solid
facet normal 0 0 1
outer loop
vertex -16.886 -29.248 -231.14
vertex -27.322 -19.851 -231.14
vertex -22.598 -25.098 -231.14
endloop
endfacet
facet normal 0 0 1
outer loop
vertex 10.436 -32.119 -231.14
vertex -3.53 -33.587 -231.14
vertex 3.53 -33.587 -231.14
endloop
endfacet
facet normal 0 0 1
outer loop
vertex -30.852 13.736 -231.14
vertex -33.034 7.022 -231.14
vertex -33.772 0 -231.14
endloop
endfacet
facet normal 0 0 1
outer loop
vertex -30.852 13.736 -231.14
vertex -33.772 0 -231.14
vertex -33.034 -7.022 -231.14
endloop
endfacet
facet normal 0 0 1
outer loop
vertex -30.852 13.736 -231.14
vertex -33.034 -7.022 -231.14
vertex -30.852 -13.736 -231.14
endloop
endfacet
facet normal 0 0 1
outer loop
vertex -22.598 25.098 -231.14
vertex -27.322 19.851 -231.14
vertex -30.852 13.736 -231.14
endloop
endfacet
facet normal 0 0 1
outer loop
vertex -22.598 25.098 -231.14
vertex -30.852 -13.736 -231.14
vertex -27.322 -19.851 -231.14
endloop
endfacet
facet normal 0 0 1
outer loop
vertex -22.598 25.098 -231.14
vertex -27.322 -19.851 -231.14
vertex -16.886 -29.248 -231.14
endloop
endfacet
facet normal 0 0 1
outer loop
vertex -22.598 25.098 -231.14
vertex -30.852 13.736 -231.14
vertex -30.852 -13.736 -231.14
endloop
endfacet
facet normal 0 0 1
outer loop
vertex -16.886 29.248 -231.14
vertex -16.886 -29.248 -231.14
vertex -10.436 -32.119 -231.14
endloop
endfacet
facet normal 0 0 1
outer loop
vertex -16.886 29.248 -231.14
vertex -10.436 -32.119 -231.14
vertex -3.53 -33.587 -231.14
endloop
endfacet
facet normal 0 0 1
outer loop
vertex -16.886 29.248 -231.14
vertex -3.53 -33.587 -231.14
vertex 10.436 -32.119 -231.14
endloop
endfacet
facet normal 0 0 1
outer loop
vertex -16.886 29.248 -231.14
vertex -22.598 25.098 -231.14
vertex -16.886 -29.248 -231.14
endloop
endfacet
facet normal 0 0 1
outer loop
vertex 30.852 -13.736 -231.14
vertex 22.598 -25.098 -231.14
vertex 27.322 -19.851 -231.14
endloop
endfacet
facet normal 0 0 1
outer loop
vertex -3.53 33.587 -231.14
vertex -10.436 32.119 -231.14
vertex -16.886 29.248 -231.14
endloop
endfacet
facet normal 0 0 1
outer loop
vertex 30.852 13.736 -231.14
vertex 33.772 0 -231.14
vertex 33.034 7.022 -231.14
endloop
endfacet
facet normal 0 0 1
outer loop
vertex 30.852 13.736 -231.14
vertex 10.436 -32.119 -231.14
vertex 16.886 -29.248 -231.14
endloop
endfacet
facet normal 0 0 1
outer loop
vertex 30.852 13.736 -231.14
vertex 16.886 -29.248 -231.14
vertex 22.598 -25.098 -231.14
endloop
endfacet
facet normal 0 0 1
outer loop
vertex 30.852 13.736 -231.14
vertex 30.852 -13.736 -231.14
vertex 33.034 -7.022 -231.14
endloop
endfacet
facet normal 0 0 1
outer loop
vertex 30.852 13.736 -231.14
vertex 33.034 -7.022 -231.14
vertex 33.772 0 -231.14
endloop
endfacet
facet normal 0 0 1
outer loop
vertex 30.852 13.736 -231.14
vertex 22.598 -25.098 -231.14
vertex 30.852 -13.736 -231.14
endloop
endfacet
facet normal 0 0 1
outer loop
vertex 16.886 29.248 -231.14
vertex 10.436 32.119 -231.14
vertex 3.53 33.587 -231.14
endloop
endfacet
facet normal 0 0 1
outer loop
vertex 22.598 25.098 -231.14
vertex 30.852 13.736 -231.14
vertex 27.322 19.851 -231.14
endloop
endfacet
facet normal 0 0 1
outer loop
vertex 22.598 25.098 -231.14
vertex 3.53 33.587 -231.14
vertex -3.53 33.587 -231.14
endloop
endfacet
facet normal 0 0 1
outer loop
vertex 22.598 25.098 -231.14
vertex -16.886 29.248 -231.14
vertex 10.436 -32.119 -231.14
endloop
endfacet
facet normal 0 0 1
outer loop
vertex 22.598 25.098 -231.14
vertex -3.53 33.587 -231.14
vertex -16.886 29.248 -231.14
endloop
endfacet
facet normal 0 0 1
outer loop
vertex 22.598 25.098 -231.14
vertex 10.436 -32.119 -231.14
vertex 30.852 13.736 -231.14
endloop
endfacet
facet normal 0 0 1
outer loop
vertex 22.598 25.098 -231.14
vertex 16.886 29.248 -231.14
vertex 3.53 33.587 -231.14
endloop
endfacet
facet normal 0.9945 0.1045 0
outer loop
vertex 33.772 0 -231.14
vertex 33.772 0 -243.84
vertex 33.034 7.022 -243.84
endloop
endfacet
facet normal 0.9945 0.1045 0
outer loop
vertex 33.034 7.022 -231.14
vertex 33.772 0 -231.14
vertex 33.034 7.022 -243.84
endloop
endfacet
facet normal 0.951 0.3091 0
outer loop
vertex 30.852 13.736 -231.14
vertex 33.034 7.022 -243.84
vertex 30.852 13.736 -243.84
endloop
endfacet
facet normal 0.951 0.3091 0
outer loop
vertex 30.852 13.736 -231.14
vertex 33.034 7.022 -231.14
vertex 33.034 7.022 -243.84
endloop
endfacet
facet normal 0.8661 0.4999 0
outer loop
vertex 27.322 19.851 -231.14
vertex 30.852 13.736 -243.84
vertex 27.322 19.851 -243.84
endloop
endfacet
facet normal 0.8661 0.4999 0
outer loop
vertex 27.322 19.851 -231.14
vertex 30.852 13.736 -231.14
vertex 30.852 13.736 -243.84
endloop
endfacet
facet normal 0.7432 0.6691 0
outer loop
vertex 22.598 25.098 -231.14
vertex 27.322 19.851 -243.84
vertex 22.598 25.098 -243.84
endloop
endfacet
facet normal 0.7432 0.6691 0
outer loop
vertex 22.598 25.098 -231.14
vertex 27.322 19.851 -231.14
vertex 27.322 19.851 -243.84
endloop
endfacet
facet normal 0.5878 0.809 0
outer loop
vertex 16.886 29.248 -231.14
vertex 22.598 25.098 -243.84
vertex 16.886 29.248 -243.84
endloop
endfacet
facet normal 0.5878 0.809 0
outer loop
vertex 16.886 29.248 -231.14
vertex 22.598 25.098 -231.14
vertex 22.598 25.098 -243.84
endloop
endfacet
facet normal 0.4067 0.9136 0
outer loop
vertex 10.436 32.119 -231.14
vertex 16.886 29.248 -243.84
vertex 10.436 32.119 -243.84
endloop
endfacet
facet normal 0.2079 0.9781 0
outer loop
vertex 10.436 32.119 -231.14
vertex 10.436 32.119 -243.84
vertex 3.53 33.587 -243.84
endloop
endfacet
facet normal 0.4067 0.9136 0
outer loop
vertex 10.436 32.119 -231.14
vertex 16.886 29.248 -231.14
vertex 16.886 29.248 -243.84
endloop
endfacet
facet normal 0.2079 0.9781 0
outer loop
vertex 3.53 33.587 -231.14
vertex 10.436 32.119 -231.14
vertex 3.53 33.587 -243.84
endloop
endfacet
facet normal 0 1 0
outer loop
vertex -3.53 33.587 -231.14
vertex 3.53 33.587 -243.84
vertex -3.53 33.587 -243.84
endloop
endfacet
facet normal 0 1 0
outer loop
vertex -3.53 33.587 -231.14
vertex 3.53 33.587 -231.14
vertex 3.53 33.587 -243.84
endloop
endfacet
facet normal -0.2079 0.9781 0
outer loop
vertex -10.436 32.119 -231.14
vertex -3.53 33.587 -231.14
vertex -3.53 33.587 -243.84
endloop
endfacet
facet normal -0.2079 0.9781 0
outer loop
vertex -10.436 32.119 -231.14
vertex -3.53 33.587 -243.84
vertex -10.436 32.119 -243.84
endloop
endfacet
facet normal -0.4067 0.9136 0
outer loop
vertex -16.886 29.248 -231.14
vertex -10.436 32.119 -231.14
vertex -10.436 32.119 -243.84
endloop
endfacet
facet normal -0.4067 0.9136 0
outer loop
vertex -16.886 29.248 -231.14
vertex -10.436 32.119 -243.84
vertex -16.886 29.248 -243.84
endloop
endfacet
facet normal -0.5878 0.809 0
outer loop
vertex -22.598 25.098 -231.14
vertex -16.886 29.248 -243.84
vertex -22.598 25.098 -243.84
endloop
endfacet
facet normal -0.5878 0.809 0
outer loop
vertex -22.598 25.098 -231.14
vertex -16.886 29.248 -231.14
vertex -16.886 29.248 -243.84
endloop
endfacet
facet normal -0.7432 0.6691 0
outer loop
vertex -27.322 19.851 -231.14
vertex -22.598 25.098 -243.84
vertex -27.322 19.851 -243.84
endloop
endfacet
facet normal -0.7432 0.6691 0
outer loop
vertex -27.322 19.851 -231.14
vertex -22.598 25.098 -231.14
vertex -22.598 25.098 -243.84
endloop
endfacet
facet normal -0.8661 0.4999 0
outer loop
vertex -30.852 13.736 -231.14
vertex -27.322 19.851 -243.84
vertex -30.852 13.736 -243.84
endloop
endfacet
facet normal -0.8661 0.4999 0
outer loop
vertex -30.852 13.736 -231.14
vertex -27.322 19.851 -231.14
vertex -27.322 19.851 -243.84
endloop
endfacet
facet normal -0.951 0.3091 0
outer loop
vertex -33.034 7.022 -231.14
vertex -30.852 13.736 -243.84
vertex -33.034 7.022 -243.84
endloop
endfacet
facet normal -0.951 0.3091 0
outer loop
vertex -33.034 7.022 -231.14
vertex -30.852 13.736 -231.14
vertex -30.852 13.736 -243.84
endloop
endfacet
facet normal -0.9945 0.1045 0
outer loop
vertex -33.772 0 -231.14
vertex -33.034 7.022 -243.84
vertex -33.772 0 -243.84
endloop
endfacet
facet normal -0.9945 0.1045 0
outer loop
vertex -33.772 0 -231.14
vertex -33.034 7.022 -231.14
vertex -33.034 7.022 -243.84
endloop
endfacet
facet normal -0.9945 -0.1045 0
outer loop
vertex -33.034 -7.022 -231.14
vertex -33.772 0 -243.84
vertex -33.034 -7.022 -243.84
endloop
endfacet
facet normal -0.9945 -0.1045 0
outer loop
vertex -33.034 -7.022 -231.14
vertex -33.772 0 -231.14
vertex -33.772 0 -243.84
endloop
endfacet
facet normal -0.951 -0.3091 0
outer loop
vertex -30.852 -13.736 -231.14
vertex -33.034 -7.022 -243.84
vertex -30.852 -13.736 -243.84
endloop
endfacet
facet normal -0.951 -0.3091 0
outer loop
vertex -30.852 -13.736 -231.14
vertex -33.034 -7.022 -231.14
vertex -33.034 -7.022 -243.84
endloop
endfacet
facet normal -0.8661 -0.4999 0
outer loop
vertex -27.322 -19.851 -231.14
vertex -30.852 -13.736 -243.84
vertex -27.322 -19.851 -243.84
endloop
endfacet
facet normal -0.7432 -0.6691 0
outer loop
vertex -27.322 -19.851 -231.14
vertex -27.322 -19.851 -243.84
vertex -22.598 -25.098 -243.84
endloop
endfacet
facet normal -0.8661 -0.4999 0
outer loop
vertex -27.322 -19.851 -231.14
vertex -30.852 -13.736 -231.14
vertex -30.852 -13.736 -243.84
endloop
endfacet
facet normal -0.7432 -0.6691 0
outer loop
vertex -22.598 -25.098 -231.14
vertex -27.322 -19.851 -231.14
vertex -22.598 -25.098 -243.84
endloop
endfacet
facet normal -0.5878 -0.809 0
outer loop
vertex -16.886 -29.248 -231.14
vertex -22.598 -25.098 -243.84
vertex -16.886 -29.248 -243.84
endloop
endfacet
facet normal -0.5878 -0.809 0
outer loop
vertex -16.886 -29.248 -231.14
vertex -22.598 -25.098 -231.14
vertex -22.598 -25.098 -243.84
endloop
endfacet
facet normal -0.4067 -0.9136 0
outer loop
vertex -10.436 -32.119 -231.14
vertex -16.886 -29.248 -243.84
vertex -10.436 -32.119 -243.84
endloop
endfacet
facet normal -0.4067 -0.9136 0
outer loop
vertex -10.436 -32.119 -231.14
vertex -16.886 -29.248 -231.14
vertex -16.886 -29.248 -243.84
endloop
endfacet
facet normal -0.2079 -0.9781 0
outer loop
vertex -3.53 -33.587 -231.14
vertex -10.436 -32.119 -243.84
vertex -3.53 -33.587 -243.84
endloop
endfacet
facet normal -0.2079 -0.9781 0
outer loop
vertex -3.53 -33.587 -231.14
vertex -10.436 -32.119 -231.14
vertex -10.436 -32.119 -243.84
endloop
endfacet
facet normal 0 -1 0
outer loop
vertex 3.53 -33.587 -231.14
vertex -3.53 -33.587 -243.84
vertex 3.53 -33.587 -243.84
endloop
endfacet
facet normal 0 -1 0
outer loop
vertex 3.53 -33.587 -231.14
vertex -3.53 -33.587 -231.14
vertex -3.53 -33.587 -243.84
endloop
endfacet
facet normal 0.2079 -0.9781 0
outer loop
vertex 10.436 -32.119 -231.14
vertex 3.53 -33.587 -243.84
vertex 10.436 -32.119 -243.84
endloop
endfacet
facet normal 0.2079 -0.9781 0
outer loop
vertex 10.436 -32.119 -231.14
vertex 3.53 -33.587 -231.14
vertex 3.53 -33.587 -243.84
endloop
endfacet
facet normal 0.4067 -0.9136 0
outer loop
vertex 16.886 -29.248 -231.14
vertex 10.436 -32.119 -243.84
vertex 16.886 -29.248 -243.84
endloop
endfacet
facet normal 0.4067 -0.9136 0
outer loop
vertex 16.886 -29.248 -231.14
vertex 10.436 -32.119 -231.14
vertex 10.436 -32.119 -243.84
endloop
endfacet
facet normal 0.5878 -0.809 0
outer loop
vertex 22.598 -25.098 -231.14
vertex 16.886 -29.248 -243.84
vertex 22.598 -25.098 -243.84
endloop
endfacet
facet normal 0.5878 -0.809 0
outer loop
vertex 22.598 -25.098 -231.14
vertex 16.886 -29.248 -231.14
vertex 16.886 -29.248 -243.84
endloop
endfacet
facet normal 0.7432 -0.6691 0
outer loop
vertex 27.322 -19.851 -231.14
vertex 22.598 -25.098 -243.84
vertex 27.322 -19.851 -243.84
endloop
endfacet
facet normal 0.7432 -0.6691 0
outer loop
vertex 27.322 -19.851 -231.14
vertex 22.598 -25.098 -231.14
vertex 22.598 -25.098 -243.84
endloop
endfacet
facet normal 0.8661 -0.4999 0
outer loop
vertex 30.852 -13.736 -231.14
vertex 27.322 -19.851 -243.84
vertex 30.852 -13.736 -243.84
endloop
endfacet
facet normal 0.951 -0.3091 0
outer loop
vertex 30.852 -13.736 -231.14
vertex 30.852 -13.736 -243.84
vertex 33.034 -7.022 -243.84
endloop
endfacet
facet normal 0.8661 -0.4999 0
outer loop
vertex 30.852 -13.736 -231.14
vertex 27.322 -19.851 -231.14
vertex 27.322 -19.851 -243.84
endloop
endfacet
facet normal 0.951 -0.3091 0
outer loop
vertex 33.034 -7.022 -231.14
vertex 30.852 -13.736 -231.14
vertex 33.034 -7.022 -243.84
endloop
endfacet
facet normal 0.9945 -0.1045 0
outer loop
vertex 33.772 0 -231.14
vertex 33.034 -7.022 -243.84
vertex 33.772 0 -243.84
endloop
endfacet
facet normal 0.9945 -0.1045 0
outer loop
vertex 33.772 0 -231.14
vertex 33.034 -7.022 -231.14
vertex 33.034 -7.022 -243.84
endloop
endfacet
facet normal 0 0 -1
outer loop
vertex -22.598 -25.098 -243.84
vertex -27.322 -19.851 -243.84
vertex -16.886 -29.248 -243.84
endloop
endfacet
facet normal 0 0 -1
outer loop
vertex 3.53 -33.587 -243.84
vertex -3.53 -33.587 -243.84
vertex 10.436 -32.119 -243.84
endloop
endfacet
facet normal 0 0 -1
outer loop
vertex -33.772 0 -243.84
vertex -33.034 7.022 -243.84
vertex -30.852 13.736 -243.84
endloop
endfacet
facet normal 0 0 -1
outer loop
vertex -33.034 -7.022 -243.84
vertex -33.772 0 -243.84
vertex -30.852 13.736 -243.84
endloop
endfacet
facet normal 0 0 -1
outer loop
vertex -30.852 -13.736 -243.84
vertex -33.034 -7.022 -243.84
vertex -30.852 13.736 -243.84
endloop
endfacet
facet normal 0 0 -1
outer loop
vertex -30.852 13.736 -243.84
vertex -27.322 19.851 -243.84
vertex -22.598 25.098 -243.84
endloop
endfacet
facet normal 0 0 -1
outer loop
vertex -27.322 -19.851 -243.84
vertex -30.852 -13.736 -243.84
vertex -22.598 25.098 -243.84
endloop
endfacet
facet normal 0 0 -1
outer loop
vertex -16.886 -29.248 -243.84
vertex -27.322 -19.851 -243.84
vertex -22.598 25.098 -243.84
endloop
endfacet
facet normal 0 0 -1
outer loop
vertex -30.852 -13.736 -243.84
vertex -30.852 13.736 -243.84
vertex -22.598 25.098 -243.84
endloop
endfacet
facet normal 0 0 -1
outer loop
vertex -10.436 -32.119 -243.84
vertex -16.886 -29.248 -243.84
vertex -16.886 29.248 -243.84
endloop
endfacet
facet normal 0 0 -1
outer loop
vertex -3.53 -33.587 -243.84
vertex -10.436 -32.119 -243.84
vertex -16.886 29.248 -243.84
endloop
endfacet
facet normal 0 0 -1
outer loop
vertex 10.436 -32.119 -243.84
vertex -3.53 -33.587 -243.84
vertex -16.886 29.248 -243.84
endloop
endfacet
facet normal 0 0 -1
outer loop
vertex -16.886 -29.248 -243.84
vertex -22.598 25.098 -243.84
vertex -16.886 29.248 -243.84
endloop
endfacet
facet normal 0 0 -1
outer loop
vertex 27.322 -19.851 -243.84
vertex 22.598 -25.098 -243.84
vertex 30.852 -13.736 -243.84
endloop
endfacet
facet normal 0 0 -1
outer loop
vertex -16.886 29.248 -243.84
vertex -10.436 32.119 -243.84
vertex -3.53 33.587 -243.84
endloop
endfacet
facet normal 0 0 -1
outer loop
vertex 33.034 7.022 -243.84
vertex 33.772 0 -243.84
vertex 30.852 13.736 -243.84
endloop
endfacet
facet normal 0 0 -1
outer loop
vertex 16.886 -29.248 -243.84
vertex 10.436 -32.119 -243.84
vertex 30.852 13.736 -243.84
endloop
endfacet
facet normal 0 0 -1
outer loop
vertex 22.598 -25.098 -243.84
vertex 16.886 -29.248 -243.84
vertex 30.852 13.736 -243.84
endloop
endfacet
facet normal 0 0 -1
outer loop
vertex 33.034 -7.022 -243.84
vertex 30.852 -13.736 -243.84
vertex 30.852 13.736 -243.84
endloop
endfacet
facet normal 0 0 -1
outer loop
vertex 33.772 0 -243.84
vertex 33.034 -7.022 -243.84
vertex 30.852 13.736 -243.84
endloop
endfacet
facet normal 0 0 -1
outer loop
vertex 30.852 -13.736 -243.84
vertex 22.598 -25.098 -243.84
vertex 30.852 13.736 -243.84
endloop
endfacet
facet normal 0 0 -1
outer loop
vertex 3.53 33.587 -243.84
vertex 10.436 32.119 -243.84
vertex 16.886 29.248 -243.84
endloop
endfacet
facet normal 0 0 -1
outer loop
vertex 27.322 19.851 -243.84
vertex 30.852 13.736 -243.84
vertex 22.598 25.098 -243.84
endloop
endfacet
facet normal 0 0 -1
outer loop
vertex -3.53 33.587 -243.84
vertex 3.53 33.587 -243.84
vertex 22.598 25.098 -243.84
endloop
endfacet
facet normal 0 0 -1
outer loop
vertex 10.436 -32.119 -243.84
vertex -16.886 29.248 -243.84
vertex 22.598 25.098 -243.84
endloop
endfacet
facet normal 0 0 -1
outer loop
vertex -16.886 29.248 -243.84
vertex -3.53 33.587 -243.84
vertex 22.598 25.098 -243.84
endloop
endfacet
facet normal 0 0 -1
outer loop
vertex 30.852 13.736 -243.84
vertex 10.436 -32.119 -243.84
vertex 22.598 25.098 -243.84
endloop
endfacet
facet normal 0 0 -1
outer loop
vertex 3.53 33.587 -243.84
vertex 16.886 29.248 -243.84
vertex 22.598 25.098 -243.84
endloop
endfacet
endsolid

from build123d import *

# Parameters (mm, degrees)
F0_R     = 33.7721508447
F1_DEPTH = 233.68
F2_DEPTH = 231.14
F3_DEPTH = 10.16


with BuildPart() as f1:
    # F0 (on Top) → F1 (new body)
    with BuildSketch(Plane.XY):
        Circle(F0_R)
    extrude(amount=-F1_DEPTH)

    # F2 (cut): a face of the model
    f2_faces = [f1.faces().sort_by_distance(p)[0] for p in [
        (0, 0, 0),
    ]]
    extrude(f2_faces, amount=-F2_DEPTH, mode=Mode.SUBTRACT)

    # F3 (add): a face of the model
    f3_faces = [f1.faces().sort_by_distance(p)[0] for p in [
        (0, 0, -233.68),
    ]]
    extrude(f3_faces, amount=F3_DEPTH)


solid = f1.part
